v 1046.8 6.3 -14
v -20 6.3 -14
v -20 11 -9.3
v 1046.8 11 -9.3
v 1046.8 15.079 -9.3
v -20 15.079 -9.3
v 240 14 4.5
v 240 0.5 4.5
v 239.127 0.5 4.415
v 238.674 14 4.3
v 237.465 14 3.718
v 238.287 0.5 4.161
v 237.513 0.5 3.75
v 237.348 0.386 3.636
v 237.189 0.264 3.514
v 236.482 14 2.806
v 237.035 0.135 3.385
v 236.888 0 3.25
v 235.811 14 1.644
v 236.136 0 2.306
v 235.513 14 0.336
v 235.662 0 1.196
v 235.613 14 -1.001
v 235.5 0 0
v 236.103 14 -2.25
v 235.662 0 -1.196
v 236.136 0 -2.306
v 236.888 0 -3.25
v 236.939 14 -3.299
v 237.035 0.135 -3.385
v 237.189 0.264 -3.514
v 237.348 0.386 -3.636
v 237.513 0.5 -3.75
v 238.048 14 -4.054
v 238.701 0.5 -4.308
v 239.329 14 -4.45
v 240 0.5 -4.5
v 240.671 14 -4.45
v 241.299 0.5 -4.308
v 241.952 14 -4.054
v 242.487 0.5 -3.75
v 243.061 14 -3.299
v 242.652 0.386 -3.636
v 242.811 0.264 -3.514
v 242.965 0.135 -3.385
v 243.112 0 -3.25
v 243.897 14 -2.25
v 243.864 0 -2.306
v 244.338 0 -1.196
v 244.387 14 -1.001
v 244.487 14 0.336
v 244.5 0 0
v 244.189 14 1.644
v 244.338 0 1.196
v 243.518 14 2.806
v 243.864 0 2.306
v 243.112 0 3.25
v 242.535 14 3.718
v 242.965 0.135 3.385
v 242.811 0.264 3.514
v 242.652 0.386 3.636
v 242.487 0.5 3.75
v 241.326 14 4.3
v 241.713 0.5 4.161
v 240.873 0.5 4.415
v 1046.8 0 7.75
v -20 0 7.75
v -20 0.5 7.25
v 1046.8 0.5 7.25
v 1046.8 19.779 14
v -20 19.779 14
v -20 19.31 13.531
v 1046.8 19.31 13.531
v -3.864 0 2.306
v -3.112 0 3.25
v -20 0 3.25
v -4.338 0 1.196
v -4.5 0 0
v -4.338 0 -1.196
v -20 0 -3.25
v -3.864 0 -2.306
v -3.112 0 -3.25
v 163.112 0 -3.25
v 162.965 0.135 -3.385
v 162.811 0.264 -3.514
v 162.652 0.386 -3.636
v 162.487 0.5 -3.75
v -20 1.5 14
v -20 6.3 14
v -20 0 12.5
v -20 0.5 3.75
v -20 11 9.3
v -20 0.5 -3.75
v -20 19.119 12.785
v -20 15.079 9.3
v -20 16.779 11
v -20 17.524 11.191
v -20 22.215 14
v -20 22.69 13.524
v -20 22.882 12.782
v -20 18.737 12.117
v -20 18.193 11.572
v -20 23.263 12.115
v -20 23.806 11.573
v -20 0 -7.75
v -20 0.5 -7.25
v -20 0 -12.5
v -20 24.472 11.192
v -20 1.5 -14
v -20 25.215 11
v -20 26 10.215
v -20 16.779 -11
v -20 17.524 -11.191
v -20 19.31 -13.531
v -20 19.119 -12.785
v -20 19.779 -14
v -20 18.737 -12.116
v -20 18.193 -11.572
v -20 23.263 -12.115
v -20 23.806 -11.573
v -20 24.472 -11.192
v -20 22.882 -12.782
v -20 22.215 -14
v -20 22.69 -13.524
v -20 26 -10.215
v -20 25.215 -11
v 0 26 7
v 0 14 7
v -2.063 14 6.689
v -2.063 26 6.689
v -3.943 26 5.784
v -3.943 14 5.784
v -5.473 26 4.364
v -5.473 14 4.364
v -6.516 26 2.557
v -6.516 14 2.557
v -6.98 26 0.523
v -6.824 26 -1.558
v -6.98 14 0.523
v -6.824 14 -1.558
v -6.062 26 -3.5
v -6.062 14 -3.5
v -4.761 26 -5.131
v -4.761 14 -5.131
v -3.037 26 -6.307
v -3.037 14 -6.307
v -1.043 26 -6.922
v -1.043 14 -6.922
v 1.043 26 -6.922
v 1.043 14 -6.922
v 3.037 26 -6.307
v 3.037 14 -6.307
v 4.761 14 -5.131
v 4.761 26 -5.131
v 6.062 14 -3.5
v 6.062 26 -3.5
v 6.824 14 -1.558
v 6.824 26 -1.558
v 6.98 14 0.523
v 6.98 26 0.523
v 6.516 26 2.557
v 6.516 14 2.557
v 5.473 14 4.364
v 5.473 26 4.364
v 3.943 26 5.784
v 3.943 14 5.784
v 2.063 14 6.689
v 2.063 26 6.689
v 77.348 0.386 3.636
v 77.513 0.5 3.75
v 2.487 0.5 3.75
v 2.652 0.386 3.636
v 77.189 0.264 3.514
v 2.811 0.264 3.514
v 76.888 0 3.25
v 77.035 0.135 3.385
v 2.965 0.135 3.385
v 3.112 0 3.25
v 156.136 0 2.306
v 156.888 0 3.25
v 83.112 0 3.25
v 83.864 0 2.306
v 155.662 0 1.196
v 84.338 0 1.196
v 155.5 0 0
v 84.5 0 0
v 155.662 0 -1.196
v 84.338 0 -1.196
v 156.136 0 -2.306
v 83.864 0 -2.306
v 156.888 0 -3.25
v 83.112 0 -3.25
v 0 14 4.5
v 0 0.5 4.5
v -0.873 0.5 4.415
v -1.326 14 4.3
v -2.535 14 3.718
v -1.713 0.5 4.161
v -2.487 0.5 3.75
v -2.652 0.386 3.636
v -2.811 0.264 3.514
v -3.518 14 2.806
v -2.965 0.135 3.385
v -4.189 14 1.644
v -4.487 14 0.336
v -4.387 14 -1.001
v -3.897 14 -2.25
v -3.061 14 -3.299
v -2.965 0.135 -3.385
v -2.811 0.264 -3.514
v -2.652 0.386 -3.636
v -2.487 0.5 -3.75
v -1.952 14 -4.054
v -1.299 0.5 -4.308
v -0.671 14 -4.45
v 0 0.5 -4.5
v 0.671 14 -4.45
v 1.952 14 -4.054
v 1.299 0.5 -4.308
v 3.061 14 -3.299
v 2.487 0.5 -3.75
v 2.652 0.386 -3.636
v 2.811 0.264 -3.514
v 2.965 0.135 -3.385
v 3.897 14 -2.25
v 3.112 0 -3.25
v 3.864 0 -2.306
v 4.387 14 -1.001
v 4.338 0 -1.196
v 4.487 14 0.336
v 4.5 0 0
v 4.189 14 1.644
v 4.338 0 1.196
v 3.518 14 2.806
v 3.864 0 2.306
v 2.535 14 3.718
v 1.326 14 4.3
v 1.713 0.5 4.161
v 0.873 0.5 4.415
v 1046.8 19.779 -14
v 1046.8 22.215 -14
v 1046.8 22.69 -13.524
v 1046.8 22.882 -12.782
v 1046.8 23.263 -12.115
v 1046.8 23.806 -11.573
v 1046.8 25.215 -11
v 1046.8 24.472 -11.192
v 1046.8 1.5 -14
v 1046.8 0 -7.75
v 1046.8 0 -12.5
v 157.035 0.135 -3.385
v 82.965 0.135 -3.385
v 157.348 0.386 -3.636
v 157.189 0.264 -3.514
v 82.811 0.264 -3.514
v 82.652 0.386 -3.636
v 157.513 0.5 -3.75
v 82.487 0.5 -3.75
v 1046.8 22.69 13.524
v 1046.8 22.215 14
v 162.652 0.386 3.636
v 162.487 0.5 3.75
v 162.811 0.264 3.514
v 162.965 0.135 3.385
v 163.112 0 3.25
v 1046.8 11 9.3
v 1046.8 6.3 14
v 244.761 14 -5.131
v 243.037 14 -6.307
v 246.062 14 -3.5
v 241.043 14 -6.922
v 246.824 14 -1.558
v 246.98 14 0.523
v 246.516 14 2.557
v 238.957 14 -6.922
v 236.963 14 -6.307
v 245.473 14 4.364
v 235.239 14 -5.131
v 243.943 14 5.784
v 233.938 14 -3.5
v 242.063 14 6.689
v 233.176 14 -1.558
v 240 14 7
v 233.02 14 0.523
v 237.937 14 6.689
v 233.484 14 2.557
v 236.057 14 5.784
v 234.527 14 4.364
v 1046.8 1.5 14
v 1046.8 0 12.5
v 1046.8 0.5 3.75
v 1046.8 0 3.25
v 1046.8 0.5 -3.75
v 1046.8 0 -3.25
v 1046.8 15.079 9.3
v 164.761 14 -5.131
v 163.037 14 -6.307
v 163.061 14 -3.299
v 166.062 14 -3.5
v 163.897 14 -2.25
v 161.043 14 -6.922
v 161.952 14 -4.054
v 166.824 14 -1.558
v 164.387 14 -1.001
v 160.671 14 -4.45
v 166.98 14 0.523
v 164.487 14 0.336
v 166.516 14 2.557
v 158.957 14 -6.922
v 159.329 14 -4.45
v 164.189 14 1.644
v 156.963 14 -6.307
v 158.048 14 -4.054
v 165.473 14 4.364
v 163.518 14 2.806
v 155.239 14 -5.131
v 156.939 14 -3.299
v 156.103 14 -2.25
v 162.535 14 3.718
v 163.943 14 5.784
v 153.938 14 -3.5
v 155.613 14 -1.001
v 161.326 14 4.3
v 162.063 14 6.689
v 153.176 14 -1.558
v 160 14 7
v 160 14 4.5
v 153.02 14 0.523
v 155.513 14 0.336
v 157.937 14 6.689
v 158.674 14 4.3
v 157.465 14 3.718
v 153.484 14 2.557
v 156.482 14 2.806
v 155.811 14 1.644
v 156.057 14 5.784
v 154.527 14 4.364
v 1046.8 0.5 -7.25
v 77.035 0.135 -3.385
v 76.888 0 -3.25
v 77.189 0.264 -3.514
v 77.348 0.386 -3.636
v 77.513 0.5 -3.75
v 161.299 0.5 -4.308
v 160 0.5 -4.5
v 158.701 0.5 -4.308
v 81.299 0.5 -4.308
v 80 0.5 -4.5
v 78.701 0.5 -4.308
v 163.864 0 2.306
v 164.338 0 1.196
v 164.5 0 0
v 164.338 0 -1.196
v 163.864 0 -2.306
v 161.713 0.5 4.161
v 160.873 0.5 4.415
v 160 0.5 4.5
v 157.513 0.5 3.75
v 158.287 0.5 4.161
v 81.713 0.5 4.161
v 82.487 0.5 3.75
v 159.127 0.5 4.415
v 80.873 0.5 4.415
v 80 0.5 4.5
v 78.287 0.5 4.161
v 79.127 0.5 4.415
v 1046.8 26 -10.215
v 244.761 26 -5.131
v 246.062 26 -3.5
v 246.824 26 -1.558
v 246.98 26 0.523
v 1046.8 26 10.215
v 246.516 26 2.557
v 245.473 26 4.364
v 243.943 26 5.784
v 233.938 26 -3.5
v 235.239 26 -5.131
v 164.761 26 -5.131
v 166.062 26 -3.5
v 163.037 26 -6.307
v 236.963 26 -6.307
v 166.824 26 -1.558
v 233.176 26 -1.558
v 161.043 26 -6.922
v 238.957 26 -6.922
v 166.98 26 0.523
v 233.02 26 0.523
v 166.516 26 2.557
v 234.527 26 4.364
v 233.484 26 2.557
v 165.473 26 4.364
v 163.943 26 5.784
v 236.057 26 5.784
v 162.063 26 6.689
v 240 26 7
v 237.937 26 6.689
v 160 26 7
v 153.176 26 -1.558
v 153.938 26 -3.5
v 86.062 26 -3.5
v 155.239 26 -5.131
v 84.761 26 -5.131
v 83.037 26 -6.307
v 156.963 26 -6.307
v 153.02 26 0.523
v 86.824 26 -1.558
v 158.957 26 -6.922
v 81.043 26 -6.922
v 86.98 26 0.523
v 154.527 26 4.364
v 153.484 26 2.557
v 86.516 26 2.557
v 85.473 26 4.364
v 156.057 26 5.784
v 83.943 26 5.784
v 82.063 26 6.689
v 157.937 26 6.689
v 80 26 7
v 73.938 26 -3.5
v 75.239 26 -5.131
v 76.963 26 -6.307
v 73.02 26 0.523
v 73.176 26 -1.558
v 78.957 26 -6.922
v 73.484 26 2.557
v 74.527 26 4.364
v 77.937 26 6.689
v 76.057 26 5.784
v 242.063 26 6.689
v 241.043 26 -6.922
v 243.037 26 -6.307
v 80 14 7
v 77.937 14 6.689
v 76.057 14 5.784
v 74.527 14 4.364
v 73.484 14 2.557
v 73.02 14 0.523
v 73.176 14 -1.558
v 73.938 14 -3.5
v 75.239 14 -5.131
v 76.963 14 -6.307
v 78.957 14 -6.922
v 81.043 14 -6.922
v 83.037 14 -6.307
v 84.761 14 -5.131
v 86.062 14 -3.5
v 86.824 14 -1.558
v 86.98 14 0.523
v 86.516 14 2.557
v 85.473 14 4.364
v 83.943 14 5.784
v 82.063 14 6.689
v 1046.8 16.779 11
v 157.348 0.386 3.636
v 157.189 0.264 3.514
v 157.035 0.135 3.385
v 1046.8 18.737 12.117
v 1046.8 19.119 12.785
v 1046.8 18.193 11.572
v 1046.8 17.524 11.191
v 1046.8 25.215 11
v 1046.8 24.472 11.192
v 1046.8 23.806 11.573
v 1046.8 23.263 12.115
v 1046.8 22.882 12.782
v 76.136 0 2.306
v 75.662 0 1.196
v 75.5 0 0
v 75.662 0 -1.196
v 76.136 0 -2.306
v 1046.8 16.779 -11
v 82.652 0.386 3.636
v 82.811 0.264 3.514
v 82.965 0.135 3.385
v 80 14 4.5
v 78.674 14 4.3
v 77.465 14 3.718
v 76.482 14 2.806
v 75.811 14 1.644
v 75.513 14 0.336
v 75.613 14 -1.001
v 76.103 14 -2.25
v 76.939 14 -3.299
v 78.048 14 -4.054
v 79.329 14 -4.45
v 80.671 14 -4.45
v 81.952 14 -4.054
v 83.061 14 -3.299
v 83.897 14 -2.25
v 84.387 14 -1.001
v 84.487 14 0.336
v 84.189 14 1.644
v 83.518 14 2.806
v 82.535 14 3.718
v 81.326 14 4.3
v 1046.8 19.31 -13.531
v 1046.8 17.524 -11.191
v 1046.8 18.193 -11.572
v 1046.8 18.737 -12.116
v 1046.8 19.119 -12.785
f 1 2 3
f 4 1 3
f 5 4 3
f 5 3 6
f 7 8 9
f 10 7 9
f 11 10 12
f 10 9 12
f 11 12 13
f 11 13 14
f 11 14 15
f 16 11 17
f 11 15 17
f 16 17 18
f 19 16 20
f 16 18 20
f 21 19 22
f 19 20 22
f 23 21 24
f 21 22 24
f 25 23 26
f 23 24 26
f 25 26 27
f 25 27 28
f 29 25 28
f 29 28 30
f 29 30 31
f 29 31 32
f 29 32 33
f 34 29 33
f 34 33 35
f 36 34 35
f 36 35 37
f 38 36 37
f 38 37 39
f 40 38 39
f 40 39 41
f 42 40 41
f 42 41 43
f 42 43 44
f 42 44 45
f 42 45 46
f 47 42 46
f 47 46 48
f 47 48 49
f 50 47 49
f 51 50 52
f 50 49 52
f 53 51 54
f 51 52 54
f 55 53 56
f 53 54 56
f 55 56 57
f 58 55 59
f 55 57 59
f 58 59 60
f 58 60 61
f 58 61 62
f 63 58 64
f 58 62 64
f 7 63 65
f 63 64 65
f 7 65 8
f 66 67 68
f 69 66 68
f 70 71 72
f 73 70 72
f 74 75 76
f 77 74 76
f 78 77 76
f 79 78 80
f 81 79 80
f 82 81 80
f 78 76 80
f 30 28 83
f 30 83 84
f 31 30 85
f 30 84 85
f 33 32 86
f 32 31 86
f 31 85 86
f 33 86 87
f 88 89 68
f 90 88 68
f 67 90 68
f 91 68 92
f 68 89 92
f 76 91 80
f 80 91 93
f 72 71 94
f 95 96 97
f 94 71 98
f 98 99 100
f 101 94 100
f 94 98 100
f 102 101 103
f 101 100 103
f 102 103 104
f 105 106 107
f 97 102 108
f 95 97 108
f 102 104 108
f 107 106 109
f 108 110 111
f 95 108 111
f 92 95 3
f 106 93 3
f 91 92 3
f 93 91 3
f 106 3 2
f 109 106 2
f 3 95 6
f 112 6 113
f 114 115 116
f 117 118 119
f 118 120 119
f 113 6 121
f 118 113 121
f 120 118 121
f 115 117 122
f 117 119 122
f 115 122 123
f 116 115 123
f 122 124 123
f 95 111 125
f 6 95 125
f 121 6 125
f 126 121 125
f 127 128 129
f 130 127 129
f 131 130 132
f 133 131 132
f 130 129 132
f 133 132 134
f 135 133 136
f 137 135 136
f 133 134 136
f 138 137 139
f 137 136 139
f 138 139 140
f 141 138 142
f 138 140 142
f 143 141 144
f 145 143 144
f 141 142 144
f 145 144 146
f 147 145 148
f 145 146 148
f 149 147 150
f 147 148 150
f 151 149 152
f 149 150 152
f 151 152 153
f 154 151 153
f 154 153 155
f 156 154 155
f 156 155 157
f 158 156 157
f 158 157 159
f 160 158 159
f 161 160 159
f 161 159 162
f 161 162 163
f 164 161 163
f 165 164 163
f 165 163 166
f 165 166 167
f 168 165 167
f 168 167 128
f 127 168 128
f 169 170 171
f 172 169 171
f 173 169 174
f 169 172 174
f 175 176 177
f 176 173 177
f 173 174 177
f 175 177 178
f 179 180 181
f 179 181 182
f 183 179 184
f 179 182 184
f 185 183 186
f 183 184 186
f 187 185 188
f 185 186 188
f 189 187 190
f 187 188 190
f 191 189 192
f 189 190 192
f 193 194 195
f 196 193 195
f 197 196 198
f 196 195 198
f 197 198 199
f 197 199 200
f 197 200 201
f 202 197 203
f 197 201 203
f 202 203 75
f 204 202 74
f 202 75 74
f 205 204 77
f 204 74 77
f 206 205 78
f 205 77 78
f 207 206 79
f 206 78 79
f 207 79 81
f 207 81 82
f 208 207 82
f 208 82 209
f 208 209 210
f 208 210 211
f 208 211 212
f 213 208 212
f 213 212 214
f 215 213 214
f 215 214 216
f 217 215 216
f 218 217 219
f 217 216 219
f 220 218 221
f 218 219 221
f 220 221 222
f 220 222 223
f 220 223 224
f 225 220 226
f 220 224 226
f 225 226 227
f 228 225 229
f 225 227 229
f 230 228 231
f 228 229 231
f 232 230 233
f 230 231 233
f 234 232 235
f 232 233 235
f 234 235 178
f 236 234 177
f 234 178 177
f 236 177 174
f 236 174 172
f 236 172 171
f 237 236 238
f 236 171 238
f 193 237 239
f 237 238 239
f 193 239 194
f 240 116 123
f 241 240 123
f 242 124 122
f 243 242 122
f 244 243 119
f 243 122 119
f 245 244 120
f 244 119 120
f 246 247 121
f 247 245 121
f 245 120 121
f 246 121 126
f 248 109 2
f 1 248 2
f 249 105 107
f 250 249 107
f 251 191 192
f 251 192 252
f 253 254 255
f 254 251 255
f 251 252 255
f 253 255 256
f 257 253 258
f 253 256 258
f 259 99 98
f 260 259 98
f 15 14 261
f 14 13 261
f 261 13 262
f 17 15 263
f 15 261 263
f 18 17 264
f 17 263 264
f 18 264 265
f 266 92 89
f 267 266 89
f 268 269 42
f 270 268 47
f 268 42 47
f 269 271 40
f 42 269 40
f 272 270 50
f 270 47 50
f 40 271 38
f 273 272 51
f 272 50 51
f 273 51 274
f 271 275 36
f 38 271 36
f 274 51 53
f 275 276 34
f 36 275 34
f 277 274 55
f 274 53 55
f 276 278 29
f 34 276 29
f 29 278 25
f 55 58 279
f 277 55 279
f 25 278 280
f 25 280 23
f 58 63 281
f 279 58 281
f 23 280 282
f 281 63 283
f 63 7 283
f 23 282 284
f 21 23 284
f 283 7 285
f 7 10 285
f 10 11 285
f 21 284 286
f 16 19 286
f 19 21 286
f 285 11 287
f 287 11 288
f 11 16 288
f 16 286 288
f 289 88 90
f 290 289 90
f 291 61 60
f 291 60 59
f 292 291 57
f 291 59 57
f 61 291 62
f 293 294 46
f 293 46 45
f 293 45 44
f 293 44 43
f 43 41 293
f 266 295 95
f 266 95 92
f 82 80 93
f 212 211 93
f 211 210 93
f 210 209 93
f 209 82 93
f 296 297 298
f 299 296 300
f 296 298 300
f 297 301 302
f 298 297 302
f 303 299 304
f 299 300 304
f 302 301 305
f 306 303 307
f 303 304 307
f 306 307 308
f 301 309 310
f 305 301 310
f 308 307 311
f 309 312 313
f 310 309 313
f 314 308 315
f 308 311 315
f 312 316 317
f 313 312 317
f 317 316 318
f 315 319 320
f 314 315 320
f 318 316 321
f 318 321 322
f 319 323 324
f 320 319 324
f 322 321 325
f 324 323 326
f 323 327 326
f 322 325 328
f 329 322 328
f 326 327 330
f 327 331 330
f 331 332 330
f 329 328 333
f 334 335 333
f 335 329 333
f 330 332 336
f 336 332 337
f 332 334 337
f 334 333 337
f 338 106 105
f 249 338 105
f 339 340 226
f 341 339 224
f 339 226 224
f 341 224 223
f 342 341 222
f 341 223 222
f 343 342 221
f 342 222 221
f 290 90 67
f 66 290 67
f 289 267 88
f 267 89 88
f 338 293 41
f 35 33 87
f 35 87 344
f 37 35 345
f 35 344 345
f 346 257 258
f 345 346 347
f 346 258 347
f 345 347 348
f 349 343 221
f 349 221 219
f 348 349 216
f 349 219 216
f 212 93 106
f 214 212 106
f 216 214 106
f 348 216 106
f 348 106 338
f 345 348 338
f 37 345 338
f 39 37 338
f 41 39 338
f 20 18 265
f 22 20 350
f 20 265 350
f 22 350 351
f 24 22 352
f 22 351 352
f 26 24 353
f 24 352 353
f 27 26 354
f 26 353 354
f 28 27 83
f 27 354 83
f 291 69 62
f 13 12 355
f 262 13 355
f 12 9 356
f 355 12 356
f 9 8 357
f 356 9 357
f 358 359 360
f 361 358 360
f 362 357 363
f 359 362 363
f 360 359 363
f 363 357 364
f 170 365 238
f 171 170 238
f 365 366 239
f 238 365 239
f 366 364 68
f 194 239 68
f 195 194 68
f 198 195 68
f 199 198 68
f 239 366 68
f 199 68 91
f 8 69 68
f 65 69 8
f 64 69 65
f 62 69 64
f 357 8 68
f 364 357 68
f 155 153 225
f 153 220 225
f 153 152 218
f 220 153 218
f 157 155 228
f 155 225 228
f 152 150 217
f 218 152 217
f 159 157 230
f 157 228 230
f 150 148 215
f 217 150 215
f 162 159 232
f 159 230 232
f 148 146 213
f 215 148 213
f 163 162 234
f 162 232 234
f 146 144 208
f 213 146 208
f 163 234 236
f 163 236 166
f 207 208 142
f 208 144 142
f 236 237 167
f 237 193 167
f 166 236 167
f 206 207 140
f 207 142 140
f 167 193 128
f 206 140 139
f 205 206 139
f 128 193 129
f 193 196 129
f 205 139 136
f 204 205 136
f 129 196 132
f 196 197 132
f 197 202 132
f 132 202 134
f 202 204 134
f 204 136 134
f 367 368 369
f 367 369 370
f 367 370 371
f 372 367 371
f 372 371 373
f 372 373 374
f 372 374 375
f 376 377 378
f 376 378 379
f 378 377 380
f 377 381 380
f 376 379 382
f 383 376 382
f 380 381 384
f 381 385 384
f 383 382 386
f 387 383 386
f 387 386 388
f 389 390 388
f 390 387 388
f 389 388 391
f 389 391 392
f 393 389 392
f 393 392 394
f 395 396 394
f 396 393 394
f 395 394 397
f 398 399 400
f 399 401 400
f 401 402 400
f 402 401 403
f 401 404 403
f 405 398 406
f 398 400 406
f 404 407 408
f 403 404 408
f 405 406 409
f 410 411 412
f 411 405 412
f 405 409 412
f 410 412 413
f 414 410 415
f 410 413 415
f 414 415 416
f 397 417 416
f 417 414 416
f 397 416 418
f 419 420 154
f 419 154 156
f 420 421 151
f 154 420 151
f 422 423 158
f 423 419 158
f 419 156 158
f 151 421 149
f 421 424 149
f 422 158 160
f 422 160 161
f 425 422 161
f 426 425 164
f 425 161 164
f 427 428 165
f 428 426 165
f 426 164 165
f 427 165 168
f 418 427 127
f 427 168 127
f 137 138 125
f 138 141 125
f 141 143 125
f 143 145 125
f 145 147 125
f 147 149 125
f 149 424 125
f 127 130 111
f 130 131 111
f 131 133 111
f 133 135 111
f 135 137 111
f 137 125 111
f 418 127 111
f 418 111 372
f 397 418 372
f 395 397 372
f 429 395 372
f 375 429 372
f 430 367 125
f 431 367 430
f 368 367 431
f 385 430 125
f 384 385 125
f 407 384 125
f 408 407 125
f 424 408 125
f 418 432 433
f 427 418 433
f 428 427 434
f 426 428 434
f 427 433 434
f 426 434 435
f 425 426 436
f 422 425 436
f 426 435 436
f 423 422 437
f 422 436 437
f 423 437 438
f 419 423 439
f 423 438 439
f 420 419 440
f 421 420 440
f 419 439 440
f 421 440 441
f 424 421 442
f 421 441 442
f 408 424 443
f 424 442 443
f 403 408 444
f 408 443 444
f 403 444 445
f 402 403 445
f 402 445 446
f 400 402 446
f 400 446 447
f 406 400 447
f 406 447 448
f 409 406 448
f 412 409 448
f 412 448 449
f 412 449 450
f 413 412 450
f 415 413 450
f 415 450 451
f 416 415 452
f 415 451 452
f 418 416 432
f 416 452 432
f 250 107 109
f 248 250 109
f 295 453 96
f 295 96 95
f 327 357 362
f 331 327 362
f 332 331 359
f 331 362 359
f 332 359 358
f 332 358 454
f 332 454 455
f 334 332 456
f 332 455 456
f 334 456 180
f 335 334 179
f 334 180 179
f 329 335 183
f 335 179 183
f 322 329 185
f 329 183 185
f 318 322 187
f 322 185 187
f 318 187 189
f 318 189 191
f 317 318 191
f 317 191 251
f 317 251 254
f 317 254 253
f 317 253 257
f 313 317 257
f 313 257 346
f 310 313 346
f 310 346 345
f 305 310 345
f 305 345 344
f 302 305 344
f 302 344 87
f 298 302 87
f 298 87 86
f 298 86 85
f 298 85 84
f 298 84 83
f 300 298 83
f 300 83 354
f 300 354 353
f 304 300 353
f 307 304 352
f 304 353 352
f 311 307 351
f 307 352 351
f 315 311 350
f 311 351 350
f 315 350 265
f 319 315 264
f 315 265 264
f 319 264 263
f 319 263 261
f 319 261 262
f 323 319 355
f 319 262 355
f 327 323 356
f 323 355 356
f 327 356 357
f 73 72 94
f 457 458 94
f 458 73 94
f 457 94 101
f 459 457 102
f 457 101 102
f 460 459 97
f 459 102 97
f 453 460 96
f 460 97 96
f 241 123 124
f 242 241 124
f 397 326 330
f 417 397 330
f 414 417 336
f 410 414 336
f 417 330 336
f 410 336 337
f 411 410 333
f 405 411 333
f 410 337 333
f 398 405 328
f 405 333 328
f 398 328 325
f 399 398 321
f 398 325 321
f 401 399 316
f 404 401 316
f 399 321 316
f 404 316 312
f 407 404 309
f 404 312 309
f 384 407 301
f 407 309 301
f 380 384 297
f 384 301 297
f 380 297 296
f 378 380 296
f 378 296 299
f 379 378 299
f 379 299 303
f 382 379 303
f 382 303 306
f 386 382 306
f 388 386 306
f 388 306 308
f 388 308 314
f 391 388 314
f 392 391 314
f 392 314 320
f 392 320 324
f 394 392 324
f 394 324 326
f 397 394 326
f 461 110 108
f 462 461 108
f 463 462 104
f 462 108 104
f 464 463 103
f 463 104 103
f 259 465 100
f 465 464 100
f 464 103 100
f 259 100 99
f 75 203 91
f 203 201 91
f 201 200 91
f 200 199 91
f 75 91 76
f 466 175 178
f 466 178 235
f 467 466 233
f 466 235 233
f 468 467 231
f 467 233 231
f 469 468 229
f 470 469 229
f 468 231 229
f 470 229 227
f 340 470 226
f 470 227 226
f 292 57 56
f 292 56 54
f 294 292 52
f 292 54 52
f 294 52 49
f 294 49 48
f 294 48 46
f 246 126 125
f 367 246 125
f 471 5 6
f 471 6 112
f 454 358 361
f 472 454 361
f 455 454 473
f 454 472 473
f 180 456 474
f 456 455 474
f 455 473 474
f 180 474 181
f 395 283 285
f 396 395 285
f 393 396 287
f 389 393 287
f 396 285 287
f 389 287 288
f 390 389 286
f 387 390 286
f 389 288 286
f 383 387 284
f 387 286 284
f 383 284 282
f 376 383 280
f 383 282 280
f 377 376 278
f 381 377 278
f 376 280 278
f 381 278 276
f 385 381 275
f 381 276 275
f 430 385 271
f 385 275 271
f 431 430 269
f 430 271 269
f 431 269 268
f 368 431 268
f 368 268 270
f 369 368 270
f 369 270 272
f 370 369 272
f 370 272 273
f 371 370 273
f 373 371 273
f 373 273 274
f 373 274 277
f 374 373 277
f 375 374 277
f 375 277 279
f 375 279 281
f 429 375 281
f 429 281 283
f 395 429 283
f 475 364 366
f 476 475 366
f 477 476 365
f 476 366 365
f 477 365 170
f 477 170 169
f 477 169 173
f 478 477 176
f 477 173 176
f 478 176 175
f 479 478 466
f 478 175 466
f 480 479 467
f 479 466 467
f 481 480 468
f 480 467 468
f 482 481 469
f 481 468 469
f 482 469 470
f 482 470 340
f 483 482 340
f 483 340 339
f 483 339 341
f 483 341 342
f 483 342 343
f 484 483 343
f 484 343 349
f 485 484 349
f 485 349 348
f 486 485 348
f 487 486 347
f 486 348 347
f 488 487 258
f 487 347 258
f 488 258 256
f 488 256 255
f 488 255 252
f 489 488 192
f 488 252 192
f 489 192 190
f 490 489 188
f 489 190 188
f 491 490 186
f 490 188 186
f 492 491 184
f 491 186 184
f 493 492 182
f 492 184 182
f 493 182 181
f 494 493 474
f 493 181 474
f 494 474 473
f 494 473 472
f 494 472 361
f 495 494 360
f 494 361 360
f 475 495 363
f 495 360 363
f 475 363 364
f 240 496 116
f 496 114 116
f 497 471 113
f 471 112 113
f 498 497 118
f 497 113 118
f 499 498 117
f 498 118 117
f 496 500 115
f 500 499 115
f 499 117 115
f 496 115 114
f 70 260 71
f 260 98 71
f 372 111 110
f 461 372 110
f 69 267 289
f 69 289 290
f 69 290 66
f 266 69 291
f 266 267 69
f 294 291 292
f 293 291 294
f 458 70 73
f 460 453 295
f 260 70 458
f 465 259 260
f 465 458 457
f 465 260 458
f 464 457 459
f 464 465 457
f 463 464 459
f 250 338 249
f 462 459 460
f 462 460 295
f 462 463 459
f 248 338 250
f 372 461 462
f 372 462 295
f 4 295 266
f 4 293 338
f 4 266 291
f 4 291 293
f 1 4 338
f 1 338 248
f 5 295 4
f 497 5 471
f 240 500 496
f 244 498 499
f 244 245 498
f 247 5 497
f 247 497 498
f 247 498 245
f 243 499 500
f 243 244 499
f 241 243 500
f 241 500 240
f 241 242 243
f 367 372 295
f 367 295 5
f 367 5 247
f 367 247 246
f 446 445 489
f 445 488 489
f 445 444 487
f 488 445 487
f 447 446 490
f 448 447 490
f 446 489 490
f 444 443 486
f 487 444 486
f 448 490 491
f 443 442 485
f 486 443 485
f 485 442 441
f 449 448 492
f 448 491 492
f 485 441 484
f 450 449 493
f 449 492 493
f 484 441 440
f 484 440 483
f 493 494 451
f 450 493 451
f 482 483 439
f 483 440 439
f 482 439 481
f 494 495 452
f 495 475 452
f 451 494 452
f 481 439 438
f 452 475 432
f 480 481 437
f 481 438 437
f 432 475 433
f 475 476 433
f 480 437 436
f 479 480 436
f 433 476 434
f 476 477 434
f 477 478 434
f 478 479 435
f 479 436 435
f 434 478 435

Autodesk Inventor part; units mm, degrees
sketch "Sketch_17" plane through (-20, 0, 0) normal (1, 0, 0) x (0, 0, -1)
  line L0 (-14, 1.5) -> (-12.5, 0)
  line L1 (-12.5, 0) -> (-7.75, 0)
  line L2 (-7.75, 0) -> (-7.25, 0.5)
  line L3 (-7.25, 0.5) -> (-3.75, 0.5)
  line L4 (-3.75, 0.5) -> (-3.25, 0)
  line L5 (-3.25, 0) -> (3.25, 0)
  line L6 (3.25, 0) -> (3.75, 0.5)
  line L7 (3.75, 0.5) -> (7.25, 0.5)
  line L8 (7.25, 0.5) -> (7.75, 0)
  line L9 (7.75, 0) -> (12.5, 0)
  line L10 (12.5, 0) -> (14, 1.5)
  line L11 (14, 1.5) -> (14, 6.3)
  line L12 (14, 6.3) -> (9.3003, 10.9996)
  line L13 (9.3003, 10.9996) -> (9.3003, 15.0794)
  line L14 (9.3003, 15.0794) -> (10.9996, 16.7787)
  arc A0 (13.5309, 19.31) -> (10.9996, 16.7787) centre (13.8696, 16.4399) ccw
  line L15 (13.5309, 19.31) -> (14, 19.7791)
  line L16 (14, 19.7791) -> (14, 22.215)
  line L17 (14, 22.215) -> (13.5245, 22.6905)
  arc A1 (11.0003, 25.2147) -> (13.5245, 22.6905) centre (13.8696, 25.5598) ccw
  line L18 (11.0003, 25.2147) -> (10.215, 26)
  line L19 (10.215, 26) -> (-10.215, 26)
  line L20 (-10.215, 26) -> (-11.0003, 25.2147)
  arc A2 (-13.5245, 22.6905) -> (-11.0003, 25.2147) centre (-13.8696, 25.5598) ccw
  line L21 (-13.5245, 22.6905) -> (-14, 22.215)
  line L22 (-14, 22.215) -> (-14, 19.7791)
  line L23 (-14, 19.7791) -> (-13.5309, 19.31)
  arc A3 (-10.9996, 16.7787) -> (-13.5309, 19.31) centre (-13.8696, 16.4399) ccw
  line L24 (-10.9996, 16.7787) -> (-9.3003, 15.0794)
  line L25 (-9.3003, 15.0794) -> (-9.3003, 10.9996)
  line L26 (-9.3003, 10.9996) -> (-14, 6.3)
  line L27 (-14, 6.3) -> (-14, 1.5)
extrude "Extrusion1" add sketch "Sketch_17" along normal blind 1066.8
sketch "Sketch2" plane through (-20, 26, 10.215) normal (0, 1, 0) x (1, 0, 0)
  point P0 (20, 10.215)
hole "Hole1" at (0, 26, 0) direction (0, -1, 0) diameter 9 depth 26 counterbore diameter 14 counterbore depth 12
pattern_linear "Rectangular Pattern1" count 4 spacing 80 along (1, 0, 0) of "Hole1"
ref_plane "4dummy_XY" through (0, 0, 0) normal (1, 0, 0) x (0, 0, -1)
ref_plane "4dummy_YZ" through (0, 0, 0) normal (0, 0, -1) x (0, 1, 0)
ref_plane "4dummy_ZX" through (0, 0, 0) normal (0, 1, 0) x (1, 0, 0)
ref_plane "4slide_XY" through (-20, 7, 0) normal (1, 0, 0) x (0, 0, -1)
ref_plane "4slide_YZ" through (-20, 7, 0) normal (0, 0, -1) x (0, 1, 0)
ref_plane "4slide_ZX" through (-20, 7, 0) normal (0, 1, 0) x (1, 0, 0)
ref_plane "4track_XY" through (0, 0, 0) normal (0, 0, 1) x (1, 0, 0)
ref_plane "4track_YZ" through (0, 0, 0) normal (1, 0, 0) x (0, 1, 0)
ref_plane "4track_ZX" through (0, 0, 0) normal (0, 1, 0) x (0, 0, 1)
properties part number "HSR30A128020 Rail(3.5)"
